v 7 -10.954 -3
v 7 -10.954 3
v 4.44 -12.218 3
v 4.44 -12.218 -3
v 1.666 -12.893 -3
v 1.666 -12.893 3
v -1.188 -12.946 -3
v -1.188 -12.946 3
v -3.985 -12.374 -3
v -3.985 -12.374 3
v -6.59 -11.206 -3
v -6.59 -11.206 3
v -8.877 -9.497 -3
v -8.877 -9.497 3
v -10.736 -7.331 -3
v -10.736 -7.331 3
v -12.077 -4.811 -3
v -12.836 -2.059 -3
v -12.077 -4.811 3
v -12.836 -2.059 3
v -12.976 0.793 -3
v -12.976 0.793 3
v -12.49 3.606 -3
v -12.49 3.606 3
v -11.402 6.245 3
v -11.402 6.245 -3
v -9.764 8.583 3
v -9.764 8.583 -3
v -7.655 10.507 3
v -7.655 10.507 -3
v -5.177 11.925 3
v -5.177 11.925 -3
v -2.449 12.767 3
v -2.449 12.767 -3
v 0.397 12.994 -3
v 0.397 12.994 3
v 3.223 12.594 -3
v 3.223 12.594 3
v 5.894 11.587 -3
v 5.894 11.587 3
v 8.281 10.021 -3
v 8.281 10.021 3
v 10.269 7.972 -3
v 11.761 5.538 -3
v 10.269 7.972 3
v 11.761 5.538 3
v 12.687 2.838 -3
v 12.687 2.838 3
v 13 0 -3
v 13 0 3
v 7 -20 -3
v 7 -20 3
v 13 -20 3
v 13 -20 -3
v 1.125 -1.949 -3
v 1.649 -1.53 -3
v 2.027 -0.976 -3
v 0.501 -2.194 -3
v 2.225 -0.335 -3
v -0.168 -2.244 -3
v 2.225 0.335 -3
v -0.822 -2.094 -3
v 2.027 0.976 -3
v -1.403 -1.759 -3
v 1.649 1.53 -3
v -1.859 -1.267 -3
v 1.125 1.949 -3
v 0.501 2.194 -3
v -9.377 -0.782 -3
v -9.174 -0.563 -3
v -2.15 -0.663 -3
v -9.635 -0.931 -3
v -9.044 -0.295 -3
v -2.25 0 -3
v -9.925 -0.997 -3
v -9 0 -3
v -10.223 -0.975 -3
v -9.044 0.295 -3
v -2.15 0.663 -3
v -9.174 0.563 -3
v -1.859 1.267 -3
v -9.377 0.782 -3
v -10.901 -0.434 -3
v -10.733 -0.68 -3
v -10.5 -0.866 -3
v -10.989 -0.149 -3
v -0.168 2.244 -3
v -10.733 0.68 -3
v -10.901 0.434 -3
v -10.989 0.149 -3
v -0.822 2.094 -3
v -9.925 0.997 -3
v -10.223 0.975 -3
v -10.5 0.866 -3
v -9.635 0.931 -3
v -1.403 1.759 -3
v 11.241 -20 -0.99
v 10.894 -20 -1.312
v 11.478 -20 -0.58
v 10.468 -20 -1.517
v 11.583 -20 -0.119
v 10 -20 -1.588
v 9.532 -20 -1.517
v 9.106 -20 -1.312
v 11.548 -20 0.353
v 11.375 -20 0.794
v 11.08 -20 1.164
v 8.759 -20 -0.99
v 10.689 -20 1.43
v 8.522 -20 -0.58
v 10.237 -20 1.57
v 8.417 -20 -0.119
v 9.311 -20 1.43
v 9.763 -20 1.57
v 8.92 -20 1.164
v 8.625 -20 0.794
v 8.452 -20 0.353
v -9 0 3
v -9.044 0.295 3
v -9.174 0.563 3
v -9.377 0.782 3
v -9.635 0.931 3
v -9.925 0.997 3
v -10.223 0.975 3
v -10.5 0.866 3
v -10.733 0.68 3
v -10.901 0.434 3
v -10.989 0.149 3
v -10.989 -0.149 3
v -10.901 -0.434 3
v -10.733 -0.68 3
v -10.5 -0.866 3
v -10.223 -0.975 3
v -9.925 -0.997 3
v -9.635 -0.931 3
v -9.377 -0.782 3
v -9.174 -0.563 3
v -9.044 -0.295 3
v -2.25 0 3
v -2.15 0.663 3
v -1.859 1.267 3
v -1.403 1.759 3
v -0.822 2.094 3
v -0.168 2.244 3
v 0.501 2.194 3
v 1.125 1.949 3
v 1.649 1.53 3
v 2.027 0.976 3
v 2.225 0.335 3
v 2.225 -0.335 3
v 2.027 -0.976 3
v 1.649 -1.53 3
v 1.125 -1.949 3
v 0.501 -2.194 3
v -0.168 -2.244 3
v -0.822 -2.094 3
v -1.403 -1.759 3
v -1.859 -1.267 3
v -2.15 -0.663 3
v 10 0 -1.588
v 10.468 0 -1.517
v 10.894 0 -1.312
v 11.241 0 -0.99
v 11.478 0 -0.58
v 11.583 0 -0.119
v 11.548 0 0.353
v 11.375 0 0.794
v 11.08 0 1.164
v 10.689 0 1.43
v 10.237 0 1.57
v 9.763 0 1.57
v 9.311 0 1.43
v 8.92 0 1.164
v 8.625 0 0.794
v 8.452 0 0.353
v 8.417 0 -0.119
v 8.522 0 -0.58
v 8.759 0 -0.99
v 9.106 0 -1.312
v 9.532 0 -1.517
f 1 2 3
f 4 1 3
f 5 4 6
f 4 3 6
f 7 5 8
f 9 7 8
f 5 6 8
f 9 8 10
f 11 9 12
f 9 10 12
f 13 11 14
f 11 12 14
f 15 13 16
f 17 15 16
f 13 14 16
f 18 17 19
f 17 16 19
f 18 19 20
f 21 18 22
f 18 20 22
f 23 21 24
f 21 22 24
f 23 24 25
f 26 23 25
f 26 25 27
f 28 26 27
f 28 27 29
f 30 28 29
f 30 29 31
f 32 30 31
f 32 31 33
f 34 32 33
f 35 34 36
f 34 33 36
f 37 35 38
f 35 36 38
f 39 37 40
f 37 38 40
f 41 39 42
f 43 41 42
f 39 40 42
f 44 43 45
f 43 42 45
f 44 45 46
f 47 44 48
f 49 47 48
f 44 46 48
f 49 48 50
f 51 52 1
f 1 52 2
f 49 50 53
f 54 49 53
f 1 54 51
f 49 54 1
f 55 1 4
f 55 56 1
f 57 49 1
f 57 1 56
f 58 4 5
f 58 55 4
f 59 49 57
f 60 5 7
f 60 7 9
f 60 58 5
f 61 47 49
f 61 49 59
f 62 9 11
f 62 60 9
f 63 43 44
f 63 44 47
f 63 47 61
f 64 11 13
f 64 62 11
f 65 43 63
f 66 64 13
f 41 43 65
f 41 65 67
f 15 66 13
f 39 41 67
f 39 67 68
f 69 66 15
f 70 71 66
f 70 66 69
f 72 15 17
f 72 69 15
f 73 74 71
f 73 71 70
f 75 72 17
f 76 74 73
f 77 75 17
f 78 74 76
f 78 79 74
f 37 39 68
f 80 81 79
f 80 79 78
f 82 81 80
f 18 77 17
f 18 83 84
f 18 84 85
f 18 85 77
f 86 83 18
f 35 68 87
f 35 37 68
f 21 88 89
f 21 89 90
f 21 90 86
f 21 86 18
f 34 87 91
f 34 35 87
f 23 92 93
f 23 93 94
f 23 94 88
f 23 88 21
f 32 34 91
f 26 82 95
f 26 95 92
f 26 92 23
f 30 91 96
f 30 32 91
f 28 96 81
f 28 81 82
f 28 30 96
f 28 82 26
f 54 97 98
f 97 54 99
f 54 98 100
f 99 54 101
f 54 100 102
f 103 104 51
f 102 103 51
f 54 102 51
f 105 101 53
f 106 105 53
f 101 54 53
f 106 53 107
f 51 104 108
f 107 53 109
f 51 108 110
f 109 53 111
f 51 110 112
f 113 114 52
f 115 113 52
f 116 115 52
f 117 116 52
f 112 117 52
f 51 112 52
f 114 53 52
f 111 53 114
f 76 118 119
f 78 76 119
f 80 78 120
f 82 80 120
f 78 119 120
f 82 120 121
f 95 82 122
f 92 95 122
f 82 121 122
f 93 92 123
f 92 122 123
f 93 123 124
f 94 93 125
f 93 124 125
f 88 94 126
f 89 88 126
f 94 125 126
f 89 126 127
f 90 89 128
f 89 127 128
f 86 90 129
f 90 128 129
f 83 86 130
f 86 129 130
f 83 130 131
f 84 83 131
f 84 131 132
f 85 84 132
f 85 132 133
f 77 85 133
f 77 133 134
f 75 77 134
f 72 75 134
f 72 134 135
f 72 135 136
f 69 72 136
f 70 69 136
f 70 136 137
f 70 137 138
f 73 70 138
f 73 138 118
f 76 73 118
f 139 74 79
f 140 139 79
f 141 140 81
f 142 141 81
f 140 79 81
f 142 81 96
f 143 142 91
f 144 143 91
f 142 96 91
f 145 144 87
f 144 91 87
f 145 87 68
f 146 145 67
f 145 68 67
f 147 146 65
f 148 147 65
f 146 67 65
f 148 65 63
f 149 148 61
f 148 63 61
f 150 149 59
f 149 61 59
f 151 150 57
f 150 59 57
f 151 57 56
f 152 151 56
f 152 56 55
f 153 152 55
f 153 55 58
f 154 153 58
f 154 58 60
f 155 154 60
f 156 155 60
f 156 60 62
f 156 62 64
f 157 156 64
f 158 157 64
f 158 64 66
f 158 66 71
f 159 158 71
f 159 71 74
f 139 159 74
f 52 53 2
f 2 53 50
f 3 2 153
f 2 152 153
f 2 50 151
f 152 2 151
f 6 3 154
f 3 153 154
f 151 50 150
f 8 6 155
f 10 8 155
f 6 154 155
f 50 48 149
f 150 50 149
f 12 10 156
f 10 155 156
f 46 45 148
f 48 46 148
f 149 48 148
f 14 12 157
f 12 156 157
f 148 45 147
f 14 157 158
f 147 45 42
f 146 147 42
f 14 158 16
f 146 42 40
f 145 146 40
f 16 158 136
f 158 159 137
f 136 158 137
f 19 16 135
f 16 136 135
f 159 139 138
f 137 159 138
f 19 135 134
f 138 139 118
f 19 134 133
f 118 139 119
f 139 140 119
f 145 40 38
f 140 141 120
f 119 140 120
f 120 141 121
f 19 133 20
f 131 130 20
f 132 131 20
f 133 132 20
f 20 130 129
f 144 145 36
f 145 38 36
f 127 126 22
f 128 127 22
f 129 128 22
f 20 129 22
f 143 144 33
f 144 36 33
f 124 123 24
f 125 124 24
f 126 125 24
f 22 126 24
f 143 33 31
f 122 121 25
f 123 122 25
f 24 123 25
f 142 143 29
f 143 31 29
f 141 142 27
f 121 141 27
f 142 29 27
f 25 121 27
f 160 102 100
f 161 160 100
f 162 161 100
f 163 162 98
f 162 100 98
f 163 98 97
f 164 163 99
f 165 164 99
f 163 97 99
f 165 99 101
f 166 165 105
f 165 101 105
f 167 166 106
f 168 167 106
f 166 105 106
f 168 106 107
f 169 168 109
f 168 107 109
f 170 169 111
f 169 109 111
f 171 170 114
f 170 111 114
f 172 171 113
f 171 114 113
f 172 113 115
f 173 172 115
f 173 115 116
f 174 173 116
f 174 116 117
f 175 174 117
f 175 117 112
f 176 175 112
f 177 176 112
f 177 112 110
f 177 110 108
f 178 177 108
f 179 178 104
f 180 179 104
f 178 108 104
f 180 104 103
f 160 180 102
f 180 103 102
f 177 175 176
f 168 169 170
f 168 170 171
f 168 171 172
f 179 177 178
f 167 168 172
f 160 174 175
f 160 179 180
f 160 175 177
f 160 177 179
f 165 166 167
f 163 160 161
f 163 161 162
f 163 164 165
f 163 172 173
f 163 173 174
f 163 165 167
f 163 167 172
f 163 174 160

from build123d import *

# Parameters (mm, degrees)
BOSS_EXTRUDE1_DEPTH  = 3
M4_CLEARANCE_HOLE1_D = 4.5
SKETCH5_R            = 1.5875
CUT_EXTRUDE1_DEPTH   = 20
SKETCH7_R            = 1
CUT_EXTRUDE2_DEPTH   = 25.596747752


with BuildPart() as part:
    # Sketch2 → Boss-Extrude1 (new, symmetric)
    with BuildSketch(Plane.XY):
        with BuildLine():
            Line((13, 0), (13, -20))
            Line((13, -20), (7, -20))
            Line((7, -20), (7, -10.95445115))
            ThreePointArc((7, -10.95445115), (-11.401754251, 6.244997998), (13, 0))
        make_face()
    extrude(amount=BOSS_EXTRUDE1_DEPTH, both=True)

    # M4 Clearance Hole1 (through all)
    with Locations(Plane.XY.offset(3)):
        with Locations((0, 0)):
            Hole(M4_CLEARANCE_HOLE1_D / 2)

    # Sketch5 → Cut-Extrude1 (cut)
    with BuildSketch(Plane.XZ.offset(20)):
        with Locations(Location((10, 0, 0), (0, 0, 270))):
            Circle(SKETCH5_R)
    extrude(amount=-CUT_EXTRUDE1_DEPTH, mode=Mode.SUBTRACT)

    # Sketch7 → Cut-Extrude2 (cut, through all)
    with BuildSketch(Plane.XY.offset(3)):
        with Locations((-10, 0)):
            Circle(SKETCH7_R)
    extrude(amount=-CUT_EXTRUDE2_DEPTH, mode=Mode.SUBTRACT)


solid = part.part
